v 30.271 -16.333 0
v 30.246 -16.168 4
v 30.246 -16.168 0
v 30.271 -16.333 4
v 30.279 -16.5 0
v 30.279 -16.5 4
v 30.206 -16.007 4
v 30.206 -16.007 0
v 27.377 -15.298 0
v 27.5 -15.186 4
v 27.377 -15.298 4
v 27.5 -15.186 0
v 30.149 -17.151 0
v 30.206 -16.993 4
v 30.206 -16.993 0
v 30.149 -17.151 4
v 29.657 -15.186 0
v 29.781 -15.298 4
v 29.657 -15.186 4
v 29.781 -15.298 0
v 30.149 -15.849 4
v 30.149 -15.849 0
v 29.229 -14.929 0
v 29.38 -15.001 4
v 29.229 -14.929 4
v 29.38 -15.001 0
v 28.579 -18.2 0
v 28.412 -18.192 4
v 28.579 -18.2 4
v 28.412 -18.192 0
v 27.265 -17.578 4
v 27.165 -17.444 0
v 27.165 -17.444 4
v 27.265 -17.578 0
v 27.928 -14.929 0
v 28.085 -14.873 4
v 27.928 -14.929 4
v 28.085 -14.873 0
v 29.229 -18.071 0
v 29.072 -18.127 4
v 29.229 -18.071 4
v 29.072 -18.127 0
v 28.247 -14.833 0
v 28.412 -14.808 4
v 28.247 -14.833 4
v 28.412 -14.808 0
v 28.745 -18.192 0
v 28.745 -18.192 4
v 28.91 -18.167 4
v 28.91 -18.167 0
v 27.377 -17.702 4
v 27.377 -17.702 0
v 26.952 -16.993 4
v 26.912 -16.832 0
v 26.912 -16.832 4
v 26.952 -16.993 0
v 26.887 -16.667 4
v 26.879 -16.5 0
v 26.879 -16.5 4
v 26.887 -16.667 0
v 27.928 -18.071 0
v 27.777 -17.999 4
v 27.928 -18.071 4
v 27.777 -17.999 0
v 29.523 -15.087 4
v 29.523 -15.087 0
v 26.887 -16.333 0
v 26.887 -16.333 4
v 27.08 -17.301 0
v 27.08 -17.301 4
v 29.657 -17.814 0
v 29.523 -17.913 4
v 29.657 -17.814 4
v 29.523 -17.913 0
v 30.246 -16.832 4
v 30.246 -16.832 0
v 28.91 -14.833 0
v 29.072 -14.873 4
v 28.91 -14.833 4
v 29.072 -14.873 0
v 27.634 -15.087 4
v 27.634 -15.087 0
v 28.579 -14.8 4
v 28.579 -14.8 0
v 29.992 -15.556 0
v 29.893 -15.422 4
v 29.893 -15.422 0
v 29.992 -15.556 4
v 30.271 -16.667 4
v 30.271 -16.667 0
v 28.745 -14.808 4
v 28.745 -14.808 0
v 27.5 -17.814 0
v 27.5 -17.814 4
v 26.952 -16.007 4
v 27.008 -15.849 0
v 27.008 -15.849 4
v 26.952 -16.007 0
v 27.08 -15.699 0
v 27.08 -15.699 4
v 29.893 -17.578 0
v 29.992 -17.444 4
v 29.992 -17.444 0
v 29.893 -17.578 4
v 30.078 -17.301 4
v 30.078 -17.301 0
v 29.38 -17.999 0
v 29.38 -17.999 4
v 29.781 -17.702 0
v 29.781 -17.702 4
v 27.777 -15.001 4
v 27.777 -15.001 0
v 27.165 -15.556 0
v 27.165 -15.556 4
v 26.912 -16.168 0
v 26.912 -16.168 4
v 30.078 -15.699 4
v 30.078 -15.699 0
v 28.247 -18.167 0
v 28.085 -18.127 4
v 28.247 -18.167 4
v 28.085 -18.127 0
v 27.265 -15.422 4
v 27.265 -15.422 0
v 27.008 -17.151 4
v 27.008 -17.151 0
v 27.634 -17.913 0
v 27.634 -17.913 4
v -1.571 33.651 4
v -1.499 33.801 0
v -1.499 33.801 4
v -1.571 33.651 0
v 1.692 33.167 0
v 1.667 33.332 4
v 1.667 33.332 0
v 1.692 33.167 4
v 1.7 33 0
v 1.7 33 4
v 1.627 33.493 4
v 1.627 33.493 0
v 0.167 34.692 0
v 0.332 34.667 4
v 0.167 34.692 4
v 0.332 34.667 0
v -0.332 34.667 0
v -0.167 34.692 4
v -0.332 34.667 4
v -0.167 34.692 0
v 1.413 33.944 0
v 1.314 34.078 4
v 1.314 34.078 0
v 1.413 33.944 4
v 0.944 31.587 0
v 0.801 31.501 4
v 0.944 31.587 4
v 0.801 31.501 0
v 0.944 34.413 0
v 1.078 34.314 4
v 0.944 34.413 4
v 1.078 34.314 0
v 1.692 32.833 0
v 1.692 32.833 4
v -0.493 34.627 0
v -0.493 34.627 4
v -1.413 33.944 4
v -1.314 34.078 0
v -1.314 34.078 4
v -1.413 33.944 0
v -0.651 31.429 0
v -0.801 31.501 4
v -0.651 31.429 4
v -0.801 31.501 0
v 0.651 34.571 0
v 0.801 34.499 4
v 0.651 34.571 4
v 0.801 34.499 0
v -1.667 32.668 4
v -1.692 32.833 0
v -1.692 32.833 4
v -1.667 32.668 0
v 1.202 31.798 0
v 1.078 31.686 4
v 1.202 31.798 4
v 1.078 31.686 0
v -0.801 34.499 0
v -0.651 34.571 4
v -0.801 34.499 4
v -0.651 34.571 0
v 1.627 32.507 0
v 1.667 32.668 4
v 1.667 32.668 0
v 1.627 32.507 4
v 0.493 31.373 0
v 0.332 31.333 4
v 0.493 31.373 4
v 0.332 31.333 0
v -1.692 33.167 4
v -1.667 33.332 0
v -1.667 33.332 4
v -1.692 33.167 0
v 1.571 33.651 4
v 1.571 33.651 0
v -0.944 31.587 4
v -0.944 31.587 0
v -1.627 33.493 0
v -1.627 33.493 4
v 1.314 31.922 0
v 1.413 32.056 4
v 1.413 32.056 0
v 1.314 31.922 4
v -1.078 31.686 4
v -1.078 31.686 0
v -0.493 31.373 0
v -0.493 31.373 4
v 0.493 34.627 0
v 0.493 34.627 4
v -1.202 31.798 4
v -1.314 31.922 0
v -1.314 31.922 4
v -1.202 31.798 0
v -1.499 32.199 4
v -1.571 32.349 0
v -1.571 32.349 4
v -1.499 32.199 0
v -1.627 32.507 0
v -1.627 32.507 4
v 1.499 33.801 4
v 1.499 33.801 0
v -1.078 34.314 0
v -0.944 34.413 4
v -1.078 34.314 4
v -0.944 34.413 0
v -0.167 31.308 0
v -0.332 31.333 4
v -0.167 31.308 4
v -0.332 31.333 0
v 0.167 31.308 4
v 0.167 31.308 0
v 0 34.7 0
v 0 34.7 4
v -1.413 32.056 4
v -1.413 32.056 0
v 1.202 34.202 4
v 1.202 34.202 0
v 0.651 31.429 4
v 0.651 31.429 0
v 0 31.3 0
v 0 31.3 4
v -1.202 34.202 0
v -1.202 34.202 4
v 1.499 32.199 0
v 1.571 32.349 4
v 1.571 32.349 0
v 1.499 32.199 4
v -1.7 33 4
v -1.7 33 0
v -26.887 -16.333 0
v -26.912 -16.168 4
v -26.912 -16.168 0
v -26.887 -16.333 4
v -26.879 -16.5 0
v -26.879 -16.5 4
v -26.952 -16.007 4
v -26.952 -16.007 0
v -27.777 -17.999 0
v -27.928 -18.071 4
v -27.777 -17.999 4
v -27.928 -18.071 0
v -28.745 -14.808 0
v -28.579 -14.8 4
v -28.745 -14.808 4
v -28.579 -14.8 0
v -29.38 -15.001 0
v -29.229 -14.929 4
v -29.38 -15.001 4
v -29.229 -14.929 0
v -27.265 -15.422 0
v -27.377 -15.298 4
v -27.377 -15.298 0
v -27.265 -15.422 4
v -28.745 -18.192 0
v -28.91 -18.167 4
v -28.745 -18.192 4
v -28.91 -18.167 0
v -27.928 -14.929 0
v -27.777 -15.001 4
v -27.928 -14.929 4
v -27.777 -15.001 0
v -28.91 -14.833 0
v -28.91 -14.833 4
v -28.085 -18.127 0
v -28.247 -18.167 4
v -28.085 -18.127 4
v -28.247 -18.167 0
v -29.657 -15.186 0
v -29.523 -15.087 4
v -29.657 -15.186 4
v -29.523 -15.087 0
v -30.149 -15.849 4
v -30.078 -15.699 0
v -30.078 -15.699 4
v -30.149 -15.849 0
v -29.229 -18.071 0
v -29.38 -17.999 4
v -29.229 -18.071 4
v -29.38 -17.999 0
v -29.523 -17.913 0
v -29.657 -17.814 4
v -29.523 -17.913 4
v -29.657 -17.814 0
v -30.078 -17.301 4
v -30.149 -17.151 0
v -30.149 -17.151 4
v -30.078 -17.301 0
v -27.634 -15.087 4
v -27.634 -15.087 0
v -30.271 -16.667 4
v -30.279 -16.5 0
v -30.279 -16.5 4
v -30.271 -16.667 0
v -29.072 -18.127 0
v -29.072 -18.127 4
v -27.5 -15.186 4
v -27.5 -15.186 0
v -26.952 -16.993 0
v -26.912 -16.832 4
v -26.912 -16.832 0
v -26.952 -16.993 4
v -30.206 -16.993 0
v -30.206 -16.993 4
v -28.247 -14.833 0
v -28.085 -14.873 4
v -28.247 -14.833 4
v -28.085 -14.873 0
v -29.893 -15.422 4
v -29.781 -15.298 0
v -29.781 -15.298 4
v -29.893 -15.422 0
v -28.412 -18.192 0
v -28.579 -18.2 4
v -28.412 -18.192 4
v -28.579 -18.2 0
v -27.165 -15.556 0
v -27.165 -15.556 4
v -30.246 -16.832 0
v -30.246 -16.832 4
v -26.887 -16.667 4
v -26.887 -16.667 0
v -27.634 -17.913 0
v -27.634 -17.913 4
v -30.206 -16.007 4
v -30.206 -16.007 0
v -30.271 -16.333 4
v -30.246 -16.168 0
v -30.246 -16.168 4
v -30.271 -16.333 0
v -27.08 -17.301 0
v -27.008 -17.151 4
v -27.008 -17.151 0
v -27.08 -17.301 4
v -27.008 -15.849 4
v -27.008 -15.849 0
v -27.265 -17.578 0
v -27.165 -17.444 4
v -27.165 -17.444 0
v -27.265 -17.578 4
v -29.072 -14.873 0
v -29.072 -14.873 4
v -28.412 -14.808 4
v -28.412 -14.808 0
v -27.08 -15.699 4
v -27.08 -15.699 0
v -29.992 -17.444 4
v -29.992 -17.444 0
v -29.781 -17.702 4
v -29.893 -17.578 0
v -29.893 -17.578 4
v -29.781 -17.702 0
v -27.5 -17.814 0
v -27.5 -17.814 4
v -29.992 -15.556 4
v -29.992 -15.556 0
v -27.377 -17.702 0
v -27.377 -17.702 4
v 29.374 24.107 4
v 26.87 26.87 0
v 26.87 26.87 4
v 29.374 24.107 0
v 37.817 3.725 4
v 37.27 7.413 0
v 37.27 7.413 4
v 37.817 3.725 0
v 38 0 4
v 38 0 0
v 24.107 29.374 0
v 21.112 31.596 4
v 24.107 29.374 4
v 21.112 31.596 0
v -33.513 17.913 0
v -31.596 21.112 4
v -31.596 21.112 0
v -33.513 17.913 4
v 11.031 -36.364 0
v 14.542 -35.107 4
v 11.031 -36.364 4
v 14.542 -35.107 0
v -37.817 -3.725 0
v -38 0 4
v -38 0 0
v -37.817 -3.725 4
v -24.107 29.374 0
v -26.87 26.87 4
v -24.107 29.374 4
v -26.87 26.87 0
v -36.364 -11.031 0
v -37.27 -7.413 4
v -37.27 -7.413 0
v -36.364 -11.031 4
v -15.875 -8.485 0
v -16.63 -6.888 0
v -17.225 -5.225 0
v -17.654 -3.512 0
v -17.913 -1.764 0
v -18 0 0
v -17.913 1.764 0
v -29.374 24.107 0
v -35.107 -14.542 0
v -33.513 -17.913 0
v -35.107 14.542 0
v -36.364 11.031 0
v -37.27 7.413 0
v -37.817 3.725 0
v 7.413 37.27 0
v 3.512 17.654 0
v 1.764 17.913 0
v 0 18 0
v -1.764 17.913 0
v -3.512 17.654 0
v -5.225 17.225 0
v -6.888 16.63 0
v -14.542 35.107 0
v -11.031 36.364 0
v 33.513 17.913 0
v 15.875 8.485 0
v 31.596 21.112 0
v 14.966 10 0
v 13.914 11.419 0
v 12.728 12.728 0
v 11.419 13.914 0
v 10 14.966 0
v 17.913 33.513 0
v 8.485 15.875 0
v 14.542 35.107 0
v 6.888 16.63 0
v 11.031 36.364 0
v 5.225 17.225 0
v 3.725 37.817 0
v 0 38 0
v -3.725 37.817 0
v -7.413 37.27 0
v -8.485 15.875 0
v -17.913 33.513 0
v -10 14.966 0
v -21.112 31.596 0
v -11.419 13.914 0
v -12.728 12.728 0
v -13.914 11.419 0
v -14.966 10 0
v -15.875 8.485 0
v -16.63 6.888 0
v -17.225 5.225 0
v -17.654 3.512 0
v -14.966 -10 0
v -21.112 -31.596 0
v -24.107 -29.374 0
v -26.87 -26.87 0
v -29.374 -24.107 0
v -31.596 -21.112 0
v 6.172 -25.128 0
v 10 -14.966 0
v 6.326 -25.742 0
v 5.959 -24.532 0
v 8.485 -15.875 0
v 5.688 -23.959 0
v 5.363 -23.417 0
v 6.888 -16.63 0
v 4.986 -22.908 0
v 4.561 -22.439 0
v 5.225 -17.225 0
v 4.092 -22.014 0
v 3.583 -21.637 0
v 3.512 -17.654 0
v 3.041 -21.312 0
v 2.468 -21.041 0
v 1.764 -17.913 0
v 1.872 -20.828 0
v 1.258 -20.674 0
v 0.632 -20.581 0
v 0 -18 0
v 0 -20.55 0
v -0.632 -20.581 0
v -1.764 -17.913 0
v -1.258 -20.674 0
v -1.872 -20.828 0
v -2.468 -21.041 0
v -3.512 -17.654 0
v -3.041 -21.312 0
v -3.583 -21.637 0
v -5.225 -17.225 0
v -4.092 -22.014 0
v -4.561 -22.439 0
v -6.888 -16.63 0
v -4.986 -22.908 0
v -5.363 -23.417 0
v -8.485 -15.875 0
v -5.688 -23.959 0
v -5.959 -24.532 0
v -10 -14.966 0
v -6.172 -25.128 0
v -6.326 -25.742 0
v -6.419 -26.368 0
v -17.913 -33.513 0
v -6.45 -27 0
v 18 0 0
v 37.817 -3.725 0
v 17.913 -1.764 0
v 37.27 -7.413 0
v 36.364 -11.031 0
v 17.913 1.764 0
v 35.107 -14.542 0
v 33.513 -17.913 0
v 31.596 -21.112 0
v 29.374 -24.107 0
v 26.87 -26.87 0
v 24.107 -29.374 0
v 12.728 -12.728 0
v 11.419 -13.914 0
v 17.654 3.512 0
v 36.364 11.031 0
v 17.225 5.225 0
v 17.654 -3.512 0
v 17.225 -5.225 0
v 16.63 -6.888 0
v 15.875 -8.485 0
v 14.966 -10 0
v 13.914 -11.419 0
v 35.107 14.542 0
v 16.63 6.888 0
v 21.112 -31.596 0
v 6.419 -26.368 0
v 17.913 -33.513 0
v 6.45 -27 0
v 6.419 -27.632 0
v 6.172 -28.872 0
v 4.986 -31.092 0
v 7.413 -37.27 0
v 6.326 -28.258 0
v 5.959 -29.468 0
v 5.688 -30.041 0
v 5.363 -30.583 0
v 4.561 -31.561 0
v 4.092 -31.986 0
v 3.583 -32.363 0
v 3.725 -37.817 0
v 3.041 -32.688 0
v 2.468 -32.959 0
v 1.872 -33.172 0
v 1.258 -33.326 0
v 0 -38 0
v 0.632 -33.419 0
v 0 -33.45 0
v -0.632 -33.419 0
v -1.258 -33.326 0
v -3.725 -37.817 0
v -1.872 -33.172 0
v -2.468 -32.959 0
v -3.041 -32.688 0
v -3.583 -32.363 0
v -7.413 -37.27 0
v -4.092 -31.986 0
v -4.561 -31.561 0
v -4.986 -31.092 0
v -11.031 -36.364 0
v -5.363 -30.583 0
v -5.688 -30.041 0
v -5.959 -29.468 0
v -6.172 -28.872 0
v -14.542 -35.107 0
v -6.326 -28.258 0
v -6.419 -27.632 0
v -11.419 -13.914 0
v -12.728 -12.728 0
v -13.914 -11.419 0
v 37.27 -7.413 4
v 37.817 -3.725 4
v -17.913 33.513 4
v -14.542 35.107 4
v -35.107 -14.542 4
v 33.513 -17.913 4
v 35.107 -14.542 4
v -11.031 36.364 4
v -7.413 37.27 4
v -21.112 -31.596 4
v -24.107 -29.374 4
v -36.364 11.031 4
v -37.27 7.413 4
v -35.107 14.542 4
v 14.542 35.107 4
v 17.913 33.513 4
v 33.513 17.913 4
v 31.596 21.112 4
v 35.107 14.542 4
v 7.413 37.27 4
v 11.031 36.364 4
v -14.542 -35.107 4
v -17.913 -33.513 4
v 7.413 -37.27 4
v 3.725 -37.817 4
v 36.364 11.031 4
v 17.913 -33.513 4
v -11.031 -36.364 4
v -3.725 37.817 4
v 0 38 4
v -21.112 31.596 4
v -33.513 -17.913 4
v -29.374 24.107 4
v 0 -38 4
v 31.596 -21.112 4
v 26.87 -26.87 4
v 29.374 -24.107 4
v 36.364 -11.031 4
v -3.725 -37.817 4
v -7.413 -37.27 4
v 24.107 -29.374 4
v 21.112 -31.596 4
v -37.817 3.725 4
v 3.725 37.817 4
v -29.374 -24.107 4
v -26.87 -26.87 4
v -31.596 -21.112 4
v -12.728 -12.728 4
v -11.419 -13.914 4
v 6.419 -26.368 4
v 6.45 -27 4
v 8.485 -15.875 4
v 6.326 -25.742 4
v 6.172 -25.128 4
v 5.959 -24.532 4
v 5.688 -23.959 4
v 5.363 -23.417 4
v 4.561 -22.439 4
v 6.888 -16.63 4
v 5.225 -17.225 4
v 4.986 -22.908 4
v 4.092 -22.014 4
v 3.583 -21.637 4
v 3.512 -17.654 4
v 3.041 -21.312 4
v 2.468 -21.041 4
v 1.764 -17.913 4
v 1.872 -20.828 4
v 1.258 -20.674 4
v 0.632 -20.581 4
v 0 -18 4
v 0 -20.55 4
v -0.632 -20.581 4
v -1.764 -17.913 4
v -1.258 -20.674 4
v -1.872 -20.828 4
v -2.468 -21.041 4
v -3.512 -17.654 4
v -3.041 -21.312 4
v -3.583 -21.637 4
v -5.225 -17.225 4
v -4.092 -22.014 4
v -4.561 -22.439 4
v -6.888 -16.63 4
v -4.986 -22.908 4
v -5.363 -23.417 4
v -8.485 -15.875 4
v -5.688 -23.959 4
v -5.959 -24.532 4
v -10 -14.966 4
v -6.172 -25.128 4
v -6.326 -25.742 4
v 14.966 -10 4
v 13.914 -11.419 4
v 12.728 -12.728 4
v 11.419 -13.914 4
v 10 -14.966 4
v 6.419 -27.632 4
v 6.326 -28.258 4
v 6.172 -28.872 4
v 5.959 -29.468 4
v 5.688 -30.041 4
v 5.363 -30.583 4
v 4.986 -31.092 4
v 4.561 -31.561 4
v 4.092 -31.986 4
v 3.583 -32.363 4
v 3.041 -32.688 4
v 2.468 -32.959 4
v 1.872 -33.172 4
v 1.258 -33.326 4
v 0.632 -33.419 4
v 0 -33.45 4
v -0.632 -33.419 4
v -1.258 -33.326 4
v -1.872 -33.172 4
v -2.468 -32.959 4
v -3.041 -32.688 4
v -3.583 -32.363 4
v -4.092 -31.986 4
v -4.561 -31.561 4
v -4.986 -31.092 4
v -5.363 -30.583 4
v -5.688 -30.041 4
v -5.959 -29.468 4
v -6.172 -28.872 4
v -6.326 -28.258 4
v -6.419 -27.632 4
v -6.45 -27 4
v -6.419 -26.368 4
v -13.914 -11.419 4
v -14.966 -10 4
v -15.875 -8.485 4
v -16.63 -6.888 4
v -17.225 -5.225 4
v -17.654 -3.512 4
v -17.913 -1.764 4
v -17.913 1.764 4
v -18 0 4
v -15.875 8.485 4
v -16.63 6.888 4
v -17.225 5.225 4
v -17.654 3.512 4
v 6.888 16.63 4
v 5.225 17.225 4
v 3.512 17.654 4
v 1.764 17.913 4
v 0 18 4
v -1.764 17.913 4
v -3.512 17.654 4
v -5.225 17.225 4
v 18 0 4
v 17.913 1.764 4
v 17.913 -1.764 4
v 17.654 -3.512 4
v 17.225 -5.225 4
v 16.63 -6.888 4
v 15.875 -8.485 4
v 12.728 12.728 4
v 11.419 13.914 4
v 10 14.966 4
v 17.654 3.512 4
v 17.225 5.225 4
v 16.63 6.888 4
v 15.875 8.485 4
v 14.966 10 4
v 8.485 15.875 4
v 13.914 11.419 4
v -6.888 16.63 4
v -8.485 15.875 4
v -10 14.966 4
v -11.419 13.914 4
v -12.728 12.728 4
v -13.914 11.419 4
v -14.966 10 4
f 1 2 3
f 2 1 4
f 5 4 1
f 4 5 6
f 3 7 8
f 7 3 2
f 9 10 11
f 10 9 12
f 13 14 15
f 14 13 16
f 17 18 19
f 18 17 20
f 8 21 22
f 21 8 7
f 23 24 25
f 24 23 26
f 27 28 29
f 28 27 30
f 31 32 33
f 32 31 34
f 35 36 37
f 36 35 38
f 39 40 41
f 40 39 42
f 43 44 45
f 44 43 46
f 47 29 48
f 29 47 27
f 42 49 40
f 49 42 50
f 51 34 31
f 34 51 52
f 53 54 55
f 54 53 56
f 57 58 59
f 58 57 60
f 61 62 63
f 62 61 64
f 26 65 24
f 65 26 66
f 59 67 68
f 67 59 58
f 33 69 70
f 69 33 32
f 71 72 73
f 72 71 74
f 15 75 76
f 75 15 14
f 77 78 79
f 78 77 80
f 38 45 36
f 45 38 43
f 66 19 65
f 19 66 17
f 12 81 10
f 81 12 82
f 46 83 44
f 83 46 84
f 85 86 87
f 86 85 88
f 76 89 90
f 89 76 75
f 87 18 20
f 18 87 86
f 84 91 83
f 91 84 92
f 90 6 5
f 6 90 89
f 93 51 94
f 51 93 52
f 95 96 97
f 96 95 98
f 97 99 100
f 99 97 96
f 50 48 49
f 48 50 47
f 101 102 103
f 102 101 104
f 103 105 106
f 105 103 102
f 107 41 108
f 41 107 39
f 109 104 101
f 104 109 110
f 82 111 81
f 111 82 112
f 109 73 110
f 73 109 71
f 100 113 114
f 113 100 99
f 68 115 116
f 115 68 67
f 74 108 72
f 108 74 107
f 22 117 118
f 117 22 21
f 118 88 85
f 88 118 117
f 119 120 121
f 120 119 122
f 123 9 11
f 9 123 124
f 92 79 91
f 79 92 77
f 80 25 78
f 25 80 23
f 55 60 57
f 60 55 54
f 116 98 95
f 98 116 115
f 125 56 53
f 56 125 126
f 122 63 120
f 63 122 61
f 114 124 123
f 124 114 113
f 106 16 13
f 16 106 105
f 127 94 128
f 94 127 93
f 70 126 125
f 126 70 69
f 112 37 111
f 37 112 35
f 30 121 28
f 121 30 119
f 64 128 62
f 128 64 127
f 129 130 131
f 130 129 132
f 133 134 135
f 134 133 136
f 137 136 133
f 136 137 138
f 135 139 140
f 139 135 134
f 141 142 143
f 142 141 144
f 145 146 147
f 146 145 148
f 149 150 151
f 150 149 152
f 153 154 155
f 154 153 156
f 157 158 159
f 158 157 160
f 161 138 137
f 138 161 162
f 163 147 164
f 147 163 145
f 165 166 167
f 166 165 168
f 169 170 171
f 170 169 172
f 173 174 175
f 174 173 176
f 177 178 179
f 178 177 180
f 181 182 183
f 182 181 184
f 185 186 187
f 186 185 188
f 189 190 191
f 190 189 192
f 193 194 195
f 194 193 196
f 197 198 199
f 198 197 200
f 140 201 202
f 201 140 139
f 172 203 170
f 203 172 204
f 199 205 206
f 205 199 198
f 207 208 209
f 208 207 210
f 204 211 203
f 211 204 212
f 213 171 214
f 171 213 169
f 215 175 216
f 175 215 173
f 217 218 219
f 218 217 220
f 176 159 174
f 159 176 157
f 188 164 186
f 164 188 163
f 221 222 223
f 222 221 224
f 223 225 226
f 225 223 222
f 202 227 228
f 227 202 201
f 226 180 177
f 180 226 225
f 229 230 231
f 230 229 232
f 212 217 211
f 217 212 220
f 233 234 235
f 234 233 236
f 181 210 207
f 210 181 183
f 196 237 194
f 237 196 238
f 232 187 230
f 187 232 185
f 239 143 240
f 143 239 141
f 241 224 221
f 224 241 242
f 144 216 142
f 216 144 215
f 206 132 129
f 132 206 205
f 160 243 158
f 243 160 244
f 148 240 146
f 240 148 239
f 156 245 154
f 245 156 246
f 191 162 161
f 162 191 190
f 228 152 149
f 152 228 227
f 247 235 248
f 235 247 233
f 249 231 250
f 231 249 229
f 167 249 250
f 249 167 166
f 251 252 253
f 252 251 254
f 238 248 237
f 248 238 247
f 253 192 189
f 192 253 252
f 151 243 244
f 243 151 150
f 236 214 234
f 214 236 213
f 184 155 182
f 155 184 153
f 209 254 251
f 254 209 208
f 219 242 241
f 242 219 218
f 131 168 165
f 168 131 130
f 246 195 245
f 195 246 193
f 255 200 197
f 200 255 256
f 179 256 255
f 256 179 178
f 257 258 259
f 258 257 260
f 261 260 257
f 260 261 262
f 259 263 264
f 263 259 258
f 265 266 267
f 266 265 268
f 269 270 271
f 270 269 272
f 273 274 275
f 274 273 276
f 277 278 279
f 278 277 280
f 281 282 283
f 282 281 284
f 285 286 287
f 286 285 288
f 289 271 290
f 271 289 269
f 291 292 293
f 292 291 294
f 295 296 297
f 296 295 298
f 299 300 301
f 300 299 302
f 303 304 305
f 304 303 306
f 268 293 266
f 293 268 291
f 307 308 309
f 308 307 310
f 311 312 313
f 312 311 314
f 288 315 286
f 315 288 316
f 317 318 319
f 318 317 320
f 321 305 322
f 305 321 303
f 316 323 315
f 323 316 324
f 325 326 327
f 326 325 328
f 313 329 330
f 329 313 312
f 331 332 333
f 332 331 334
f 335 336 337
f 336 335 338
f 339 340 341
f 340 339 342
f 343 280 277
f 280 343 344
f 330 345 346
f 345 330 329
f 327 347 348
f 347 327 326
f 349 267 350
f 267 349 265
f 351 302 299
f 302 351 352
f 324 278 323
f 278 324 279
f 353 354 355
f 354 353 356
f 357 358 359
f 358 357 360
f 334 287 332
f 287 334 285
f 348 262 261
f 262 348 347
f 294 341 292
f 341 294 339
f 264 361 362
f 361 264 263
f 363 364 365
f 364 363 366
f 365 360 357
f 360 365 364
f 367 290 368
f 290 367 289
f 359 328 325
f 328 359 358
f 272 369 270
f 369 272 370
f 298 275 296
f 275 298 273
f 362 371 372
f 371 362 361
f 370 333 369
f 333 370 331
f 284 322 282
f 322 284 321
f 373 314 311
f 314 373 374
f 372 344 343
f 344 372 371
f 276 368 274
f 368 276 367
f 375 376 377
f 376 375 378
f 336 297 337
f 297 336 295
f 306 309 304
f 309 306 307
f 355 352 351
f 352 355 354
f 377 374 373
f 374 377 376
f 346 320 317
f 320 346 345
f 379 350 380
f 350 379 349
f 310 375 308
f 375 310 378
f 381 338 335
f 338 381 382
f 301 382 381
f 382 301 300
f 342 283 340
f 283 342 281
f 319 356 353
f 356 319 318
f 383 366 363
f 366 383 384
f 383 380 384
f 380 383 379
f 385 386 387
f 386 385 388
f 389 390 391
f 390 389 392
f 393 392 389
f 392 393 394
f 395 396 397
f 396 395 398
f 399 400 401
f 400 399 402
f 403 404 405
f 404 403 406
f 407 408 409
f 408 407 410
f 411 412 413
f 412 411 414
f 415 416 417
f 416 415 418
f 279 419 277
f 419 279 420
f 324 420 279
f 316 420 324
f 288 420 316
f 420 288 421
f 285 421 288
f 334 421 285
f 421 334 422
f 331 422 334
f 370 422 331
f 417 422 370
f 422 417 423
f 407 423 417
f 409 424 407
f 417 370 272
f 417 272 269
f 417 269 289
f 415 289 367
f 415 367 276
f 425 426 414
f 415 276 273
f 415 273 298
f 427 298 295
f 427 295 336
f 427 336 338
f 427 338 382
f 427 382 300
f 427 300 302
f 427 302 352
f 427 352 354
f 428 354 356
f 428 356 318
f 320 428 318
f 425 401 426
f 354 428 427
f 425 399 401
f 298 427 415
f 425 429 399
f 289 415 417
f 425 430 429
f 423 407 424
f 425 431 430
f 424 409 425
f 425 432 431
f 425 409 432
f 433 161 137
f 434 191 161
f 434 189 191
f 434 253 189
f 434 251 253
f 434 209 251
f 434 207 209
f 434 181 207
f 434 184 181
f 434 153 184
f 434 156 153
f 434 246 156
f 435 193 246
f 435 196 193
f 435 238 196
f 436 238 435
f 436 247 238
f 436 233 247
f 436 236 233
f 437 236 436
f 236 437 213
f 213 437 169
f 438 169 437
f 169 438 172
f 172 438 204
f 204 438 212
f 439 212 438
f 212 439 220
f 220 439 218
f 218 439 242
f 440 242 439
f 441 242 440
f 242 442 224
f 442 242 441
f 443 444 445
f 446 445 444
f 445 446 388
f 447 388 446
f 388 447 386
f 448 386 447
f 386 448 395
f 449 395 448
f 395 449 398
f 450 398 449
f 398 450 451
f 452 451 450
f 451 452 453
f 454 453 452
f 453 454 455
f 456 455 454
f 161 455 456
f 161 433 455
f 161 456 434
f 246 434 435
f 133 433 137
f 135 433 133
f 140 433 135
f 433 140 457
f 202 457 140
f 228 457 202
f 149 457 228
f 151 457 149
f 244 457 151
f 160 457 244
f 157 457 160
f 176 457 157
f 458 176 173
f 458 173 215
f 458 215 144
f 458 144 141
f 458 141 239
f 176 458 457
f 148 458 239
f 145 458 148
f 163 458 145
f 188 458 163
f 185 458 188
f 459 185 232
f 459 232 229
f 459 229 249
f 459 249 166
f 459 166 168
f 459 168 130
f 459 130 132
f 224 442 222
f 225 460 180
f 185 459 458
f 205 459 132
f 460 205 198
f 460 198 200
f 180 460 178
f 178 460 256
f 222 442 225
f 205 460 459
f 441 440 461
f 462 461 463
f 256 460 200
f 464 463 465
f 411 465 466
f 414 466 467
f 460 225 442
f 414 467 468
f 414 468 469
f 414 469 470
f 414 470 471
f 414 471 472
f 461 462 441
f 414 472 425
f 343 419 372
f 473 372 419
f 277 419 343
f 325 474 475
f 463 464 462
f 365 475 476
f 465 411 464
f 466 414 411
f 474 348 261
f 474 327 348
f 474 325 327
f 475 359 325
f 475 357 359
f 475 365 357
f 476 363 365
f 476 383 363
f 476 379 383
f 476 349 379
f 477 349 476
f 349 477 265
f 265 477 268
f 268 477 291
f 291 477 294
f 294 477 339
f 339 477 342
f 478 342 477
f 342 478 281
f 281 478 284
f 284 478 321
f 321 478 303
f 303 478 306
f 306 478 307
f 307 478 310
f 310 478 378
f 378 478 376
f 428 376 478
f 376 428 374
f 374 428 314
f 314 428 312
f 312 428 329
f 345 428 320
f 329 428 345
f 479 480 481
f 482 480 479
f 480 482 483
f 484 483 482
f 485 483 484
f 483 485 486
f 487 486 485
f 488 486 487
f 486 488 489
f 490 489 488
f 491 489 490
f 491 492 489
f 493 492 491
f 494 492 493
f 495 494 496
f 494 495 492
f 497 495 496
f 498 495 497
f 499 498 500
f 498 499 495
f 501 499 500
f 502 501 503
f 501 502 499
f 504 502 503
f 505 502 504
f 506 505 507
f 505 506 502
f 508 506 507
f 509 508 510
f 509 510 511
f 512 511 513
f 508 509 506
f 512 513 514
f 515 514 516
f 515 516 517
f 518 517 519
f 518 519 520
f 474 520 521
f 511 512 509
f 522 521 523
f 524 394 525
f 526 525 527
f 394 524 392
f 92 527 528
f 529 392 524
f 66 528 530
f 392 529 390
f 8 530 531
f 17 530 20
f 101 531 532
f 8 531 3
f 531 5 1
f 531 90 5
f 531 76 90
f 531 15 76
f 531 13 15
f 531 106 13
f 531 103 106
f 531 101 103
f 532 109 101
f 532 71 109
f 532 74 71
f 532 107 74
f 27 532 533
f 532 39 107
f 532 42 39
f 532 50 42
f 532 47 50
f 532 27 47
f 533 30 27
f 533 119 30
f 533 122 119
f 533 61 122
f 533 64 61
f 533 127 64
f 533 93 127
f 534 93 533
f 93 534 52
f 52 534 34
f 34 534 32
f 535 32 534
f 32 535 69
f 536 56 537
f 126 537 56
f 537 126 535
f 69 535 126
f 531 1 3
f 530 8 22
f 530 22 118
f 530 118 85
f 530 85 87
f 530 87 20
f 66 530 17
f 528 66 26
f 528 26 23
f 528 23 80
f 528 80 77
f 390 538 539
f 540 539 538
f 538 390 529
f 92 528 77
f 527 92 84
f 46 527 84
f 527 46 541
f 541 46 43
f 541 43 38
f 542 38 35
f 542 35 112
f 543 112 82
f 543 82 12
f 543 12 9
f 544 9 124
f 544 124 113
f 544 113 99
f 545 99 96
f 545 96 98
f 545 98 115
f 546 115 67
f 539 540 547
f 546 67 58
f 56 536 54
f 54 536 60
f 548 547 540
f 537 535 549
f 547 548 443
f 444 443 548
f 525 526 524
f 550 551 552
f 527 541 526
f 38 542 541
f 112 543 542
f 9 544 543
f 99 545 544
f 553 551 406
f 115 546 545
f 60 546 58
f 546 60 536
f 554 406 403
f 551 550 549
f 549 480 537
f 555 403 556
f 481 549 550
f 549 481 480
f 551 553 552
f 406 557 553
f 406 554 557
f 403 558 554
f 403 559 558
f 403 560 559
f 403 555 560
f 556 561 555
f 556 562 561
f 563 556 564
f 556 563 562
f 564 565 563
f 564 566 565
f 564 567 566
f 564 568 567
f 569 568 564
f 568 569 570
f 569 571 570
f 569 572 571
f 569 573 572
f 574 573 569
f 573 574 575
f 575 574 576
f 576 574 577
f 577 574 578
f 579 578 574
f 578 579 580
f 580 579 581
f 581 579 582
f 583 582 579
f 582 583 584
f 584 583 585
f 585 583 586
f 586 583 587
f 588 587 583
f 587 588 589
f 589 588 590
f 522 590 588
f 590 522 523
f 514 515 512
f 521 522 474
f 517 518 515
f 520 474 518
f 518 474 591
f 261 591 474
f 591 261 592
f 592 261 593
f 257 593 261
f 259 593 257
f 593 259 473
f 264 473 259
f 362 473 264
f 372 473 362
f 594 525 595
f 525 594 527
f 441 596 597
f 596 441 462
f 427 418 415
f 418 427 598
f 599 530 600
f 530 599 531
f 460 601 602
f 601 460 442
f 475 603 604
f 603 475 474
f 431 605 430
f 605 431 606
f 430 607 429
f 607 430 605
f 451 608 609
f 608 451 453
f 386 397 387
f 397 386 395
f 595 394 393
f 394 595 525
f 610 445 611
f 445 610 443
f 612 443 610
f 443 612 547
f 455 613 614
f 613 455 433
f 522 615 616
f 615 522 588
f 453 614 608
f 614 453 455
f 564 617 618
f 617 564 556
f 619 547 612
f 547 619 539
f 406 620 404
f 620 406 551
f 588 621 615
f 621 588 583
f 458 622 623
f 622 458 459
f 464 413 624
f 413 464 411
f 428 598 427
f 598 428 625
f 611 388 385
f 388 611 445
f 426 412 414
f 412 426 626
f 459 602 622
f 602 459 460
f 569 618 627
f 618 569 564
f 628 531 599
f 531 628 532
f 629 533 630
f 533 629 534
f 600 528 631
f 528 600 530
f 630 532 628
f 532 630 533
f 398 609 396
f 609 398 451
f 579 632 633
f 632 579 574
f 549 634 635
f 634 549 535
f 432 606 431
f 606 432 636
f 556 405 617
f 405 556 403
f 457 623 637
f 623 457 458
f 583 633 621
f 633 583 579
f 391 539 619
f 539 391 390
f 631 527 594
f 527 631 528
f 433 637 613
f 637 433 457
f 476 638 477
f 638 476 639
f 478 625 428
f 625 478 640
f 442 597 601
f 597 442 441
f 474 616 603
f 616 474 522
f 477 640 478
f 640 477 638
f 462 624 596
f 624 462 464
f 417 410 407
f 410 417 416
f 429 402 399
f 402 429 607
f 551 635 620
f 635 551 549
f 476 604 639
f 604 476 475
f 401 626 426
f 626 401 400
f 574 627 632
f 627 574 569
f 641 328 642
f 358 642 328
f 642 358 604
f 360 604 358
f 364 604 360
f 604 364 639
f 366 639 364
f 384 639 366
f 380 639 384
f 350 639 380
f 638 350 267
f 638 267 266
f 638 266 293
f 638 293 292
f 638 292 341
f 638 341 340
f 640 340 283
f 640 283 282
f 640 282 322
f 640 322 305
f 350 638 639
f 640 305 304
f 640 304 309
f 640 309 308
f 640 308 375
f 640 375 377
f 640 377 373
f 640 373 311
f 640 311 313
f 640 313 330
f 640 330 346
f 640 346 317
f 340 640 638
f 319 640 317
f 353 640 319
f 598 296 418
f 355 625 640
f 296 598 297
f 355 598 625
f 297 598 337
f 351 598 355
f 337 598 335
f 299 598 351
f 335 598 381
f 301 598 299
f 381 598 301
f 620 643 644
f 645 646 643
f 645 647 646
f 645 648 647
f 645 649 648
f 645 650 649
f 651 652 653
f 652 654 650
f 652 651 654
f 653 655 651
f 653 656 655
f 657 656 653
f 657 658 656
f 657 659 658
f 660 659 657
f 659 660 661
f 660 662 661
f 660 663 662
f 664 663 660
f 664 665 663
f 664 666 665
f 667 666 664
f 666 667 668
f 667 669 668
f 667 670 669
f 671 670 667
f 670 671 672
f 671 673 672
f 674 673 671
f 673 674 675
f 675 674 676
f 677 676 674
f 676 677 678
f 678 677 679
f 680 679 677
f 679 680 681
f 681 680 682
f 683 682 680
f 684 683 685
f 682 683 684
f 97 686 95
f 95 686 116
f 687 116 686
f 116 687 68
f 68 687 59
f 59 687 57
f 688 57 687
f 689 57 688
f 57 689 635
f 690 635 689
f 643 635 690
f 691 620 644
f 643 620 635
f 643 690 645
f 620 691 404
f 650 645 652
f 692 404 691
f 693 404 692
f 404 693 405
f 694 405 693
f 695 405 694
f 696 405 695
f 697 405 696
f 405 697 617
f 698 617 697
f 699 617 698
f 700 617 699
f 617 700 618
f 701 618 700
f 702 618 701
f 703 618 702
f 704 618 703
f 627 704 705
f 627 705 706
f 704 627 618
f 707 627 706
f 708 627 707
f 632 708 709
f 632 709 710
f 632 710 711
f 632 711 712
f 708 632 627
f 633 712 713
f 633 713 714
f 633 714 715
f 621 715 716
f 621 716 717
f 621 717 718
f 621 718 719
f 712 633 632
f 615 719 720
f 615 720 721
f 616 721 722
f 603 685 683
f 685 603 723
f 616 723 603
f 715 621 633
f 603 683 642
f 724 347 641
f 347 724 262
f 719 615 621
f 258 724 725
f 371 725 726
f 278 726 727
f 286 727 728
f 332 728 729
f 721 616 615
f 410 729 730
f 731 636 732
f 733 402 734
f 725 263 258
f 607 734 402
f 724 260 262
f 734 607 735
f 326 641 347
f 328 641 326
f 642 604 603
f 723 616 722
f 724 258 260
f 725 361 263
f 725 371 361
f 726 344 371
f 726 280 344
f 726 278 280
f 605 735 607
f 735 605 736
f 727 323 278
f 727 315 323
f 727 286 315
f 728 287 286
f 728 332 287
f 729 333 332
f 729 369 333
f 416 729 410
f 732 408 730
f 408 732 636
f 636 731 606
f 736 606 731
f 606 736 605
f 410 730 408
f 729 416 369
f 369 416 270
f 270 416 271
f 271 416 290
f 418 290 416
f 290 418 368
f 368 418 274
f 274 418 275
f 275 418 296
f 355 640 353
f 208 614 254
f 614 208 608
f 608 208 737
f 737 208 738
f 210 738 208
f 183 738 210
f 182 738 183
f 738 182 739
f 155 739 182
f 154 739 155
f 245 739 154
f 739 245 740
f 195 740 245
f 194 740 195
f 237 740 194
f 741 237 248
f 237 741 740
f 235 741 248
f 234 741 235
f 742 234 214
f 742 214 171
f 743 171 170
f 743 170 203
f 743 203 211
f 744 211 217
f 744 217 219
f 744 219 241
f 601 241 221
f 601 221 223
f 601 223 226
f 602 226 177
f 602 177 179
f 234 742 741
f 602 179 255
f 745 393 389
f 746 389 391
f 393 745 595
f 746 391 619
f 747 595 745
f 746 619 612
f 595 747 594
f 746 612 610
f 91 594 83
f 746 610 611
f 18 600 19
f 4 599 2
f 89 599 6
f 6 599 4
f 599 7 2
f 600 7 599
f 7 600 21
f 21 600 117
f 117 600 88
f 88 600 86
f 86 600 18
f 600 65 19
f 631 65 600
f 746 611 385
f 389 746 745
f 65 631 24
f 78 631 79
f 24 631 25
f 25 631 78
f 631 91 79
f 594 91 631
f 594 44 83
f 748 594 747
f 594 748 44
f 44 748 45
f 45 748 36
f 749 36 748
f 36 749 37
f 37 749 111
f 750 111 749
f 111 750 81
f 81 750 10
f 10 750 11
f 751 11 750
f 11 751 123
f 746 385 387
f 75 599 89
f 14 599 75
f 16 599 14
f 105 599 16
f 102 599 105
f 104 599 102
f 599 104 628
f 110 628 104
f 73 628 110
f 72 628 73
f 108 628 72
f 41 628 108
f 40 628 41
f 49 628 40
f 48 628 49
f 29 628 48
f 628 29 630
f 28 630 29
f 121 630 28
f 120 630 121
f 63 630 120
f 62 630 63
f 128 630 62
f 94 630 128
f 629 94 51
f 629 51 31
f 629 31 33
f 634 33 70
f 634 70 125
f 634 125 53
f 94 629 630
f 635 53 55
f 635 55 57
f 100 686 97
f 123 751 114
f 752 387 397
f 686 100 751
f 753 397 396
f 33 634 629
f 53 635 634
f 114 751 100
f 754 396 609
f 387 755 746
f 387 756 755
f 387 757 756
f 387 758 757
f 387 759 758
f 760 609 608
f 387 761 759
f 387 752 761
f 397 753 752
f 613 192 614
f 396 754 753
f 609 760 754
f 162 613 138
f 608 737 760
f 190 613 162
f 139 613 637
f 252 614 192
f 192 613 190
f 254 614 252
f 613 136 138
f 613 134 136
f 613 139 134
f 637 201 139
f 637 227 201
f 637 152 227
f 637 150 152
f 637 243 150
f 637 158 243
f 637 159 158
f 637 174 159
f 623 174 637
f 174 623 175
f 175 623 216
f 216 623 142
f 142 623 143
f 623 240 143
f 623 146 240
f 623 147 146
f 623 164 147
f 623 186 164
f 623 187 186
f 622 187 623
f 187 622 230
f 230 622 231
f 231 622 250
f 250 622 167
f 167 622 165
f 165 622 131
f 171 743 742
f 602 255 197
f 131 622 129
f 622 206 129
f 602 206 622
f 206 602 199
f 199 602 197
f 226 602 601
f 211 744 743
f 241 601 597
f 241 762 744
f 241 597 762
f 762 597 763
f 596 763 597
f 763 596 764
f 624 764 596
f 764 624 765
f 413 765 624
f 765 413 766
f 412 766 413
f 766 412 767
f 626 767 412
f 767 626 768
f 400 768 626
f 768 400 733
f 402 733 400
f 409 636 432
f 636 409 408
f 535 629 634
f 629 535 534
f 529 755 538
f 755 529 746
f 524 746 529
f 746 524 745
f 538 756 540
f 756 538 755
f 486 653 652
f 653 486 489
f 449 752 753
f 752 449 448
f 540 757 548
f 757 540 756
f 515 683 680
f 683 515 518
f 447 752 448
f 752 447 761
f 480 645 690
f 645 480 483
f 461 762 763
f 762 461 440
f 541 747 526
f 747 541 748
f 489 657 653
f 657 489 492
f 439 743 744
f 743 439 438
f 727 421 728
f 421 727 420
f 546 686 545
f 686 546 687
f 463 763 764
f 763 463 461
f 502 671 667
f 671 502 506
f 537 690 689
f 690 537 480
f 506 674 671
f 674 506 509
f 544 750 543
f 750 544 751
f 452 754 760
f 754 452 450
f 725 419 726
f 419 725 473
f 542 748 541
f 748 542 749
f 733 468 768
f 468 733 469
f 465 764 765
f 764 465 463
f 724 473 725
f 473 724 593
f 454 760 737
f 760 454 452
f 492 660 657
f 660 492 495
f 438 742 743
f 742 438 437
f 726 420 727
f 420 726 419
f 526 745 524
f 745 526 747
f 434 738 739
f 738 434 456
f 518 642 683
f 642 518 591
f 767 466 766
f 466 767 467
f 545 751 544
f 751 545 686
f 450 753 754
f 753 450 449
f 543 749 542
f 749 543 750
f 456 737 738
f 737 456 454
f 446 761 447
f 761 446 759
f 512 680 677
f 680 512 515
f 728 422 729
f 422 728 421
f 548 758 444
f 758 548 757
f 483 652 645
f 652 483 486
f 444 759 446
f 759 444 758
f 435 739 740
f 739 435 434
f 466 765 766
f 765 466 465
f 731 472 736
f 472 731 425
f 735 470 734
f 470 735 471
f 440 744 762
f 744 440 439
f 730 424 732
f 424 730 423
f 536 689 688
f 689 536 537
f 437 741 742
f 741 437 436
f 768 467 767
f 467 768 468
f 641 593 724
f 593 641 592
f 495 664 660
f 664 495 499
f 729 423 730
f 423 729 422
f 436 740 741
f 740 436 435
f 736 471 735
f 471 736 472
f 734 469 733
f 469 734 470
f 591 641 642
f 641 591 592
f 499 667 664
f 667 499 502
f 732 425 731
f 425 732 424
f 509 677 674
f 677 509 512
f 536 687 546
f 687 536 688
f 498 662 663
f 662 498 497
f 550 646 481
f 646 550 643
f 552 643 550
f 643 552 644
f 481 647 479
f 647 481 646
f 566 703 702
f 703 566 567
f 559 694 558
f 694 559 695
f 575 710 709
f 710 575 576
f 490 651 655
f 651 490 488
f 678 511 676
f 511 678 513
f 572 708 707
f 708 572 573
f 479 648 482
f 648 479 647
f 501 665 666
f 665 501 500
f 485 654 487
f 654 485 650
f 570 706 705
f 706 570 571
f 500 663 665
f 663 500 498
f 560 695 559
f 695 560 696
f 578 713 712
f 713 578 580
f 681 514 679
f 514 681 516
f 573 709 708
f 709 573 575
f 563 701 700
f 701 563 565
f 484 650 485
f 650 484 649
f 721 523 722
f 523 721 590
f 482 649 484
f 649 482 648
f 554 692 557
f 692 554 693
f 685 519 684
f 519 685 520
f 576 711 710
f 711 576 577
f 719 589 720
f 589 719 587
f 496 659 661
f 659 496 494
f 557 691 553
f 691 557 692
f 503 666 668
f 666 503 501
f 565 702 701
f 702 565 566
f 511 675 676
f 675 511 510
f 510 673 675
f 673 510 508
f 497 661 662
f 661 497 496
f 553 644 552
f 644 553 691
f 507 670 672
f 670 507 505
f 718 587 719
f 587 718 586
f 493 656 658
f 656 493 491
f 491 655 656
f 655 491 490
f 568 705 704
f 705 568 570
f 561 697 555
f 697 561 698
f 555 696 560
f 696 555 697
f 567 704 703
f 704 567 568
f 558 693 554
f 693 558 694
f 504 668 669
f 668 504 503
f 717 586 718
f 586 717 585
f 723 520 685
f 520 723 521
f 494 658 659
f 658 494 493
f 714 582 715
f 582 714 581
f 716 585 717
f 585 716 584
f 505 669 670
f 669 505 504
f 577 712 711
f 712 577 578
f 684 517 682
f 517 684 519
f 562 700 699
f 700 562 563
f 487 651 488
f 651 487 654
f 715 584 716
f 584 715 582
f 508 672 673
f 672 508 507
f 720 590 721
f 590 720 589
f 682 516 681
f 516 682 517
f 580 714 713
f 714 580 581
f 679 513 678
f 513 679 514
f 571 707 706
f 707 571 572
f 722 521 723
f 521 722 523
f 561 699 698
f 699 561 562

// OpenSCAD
// file: ../lib/shapes.scad
// Small reusable helper modules shared across the feeder parts.
// Include dimensions.scad before this if a module needs one of its constants
// (none currently do -- these are pure geometry helpers).

// 2D profile of a D-shaft: a circle of diameter `d` with a flat cut `flat_depth`
// in from the edge. Extrude this to cut a D-shaft hole, or use it solid to
// model the shaft itself for a fit check.
module dshaft_2d(d, flat_depth) {
    r = d / 2;
    intersection() {
        circle(d = d);
        translate([-r - 1, -(r - flat_depth), 0])
            square([2 * r + 2, 2 * r + 2]);
    }
}

// 3D D-shaft hole, centered on the Z axis, extruded along Z, centered in Z.
module dshaft_hole(d, flat_depth, length) {
    linear_extrude(height = length, center = true)
        dshaft_2d(d, flat_depth);
}

// Places `count` copies of its children evenly around a circle of radius `r`,
// starting at `start_angle`. Each child is translated (not rotated) to its
// position -- use this for pins/magnet pockets that don't need to face inward.
module orbit(r, count, start_angle = 0) {
    for (i = [0 : count - 1]) {
        a = start_angle + i * 360 / count;
        translate([r * cos(a), r * sin(a), 0])
            children();
    }
}
// file: ../lib/dimensions.scad
// Shared dimensions for the OpenAnnealer feeder subsystem (hopper + singulator
// disk + face plate + drive hub). Single source of truth: every part file
// includes this instead of hard-coding numbers, so the hub/disk/face-plate
// interface is guaranteed to fit by construction. Change a value here and
// re-render everything rather than hand-editing a derived number downstream.
//
// All dimensions in mm.

$fn = 64;

// ---------------------------------------------------------------------------
// Case family: .223 Remington / 5.56x45 NATO (fired brass, no bullet)
//
// SAAMI reference values -- these are nominal/max published dimensions, NOT
// measurements off real brass. Verify with calipers before cutting the first
// print. See docs/DESIGN.md "Case-family reference groups" for the other
// family groups this will eventually need.
// ---------------------------------------------------------------------------
CASE_LENGTH = 44.70;  // max case length (SAAMI)
CASE_RIM_D  = 9.60;   // rim/head diameter (max) -- the feature the disk pocket clears
CASE_RIM_T  = 1.15;   // rim thickness (reference only, not used in the fits below)
CASE_BODY_D = 9.50;   // body diameter just ahead of the extractor groove (reference only)

// ---------------------------------------------------------------------------
// General fit tolerances -- first-pass guesses for FDM. Print a small test
// coupon (a short section of each fit) before committing to a full part, and
// adjust these three numbers rather than hand-editing the fits below.
// ---------------------------------------------------------------------------
CLEARANCE_LOOSE = 0.40;  // radial clearance for a part that must spin/drop freely (pocket hole, pin sockets)
CLEARANCE_SNUG  = 0.15;  // radial clearance for a locating/pilot fit
CLEARANCE_PRESS = -0.10; // negative = interference, for press-fit magnet pockets

// ---------------------------------------------------------------------------
// Singulator disk
// ---------------------------------------------------------------------------
DISK_OD        = 72;
DISK_THICKNESS = 5;

POCKET_ORBIT_R = 27;                                // radius from the rotation axis to the pocket hole's center
POCKET_HOLE_D  = CASE_RIM_D + 2*CLEARANCE_LOOSE;     // clears the case rim -- this hole does NOT catch the case;
                                                      // the face plate below does. See docs/DESIGN.md "Hopper +
                                                      // singulator disk".

// ---------------------------------------------------------------------------
// Face plate (stationary) -- blocks the pocket everywhere except one cutout
// ---------------------------------------------------------------------------
FACEPLATE_OD             = 76;
FACEPLATE_THICKNESS      = 4;
FACEPLATE_CLEARANCE_GAP  = 0.5;   // running clearance between the disk's back face and the face plate's front face
FACEPLATE_CENTER_CLEAR_D = 36;    // central clearance hole the hub's pins/magnets/boss pass through unblocked
DISCHARGE_CUTOUT_D       = POCKET_HOLE_D + 2.5;  // bigger than the pocket hole for rotational alignment slop
DISCHARGE_ANGLE          = 270;   // degrees, this part's local frame -- chosen so that, given the X-axis tilt
                                   // feeder_assembly.scad applies, this angle actually ends up lowest (real
                                   // "downhill" direction), rather than being an arbitrary illustrative choice

// ---------------------------------------------------------------------------
// Motor-side quick-change hub
//
// Fixed to the feeder motor's shaft ONCE (grub screw, set-and-forget). Every
// case-family disk pops on/off this same hub tool-lessly: 3 drive pins carry
// the actual torque, 3 magnets hold the disk on axially. No grub screw is
// ever touched again after the initial motor install.
// ---------------------------------------------------------------------------
DSHAFT_D          = 5.0;   // NEMA17 5mm D-shaft
DSHAFT_FLAT_DEPTH = 0.5;   // how far the flat is cut in from the full-diameter edge (typical for a 5mm D-shaft;
                            // measure yours -- this varies by manufacturer)
HUB_OD            = 30;    // hub body, sits behind the face plate -- does not need to pass through anything
HUB_LENGTH        = 14;    // along the shaft
HUB_SETSCREW_D    = 2.6;   // pilot for an M3 thread-forming screw (drill/tap after printing, or press in a
                            // brass insert) -- this is the ONLY fastener touched when installing the motor

ENGAGEMENT_DEPTH = 4;  // how far the boss/pins reach into the disk's back face -- shared so both bottom out together

PILOT_BOSS_D   = 8;    // centers the disk on the hub
PILOT_BOSS_LEN = FACEPLATE_THICKNESS + 2*FACEPLATE_CLEARANCE_GAP + ENGAGEMENT_DEPTH;  // face plate + both running
                                                                                        // gaps + engagement

DRIVE_PIN_D       = 3.0;
DRIVE_PIN_LEN     = FACEPLATE_THICKNESS + 2*FACEPLATE_CLEARANCE_GAP + ENGAGEMENT_DEPTH;
DRIVE_PIN_ORBIT_R = 12;
DRIVE_PIN_COUNT   = 3;

MAGNET_D            = 6.0;   // common small neodymium disc magnet -- confirm against what you actually source
MAGNET_THICKNESS    = 2.0;
MAGNET_ORBIT_R      = 14;
MAGNET_COUNT        = 3;
MAGNET_ANGLE_OFFSET = 60;    // rotates the magnet circle relative to the pin circle, purely so the two sets of
                              // pockets don't crowd each other -- hub and disk both use this same constant so
                              // they always line up

// ---------------------------------------------------------------------------
// Sanity checks -- these catch a future dimension edit that would silently
// break the fit (e.g. shrinking the face plate's clearance hole until it
// clips the magnets, or growing the pocket orbit until it exits the disk).
// If OpenSCAD throws one of these, a value above needs to change, not this
// assertion.
// ---------------------------------------------------------------------------
assert(MAGNET_ORBIT_R + MAGNET_D/2 < FACEPLATE_CENTER_CLEAR_D/2,
    "drive hub magnets must fit inside the face plate's central clearance hole");
assert(DRIVE_PIN_ORBIT_R + DRIVE_PIN_D/2 < FACEPLATE_CENTER_CLEAR_D/2,
    "drive pins must fit inside the face plate's central clearance hole");
assert(PILOT_BOSS_D/2 < DRIVE_PIN_ORBIT_R - DRIVE_PIN_D/2,
    "pilot boss must not overlap the drive pin circle");
assert(POCKET_ORBIT_R - POCKET_HOLE_D/2 > FACEPLATE_CENTER_CLEAR_D/2,
    "pocket hole's inner edge must clear the face plate's central hole, so it stays over solid blocking material");
assert(POCKET_ORBIT_R + POCKET_HOLE_D/2 < DISK_OD/2 - 2,
    "pocket hole must stay well inside the disk's outer edge (2mm min rim)");
assert(POCKET_ORBIT_R + DISCHARGE_CUTOUT_D/2 < FACEPLATE_OD/2 - 2,
    "discharge cutout must stay well inside the face plate's outer edge (2mm min rim)");
// main file
// Stationary face plate -- sits between the singulator disk and the drive
// hub. Blocks the disk's pocket hole everywhere except one discharge cutout,
// which is what actually singulates: a captured case rides around, blocked
// from falling through, until the pocket's rotation lines up with this
// cutout and the case drops through into the chute below. See
// docs/DESIGN.md "Hopper + singulator disk".
//
// This part does NOT rotate -- it mounts fixed to the housing. The hub's
// pins/boss/magnets pass through its central clearance hole completely
// unblocked to reach the disk on the other side; only the pocket's orbit
// (further out, at POCKET_ORBIT_R) is actually blocked by this plate.
//
// Coordinate convention: Z=0 is the FRONT face (facing the disk, separated by
// FACEPLATE_CLEARANCE_GAP). Z=FACEPLATE_THICKNESS is the BACK face (facing
// the hub, separated by another FACEPLATE_CLEARANCE_GAP).
//
// DISCHARGE_ANGLE (dimensions.scad) sets where the cutout sits, in this
// part's own local frame -- feeder_assembly.scad is what maps that to the
// real "downhill" direction once the ~45 degree tilt is applied.
//
// Open this file directly in OpenSCAD to preview just the face plate.

include <../lib/dimensions.scad>
include <../lib/shapes.scad>

MOUNT_HOLE_D = 3.4;              // M3 clearance
MOUNT_HOLE_ORBIT_R = FACEPLATE_OD/2 - 5;
MOUNT_HOLE_COUNT = 3;
MOUNT_HOLE_START_ANGLE = DISCHARGE_ANGLE + 60;  // offset off the discharge cutout so nothing overlaps

module face_plate() {
    difference() {
        cylinder(d = FACEPLATE_OD, h = FACEPLATE_THICKNESS);

        // Central clearance -- hub's pins/boss/magnets pass through untouched
        translate([0, 0, -1])
            cylinder(d = FACEPLATE_CENTER_CLEAR_D, h = FACEPLATE_THICKNESS + 2);

        // Discharge cutout -- the one place a captured case is allowed through
        translate([POCKET_ORBIT_R * cos(DISCHARGE_ANGLE), POCKET_ORBIT_R * sin(DISCHARGE_ANGLE), -1])
            cylinder(d = DISCHARGE_CUTOUT_D, h = FACEPLATE_THICKNESS + 2);

        // Mounting holes into the housing
        orbit(MOUNT_HOLE_ORBIT_R, MOUNT_HOLE_COUNT, MOUNT_HOLE_START_ANGLE)
            translate([0, 0, -1])
                cylinder(d = MOUNT_HOLE_D, h = FACEPLATE_THICKNESS + 2);
    }
}

face_plate();
